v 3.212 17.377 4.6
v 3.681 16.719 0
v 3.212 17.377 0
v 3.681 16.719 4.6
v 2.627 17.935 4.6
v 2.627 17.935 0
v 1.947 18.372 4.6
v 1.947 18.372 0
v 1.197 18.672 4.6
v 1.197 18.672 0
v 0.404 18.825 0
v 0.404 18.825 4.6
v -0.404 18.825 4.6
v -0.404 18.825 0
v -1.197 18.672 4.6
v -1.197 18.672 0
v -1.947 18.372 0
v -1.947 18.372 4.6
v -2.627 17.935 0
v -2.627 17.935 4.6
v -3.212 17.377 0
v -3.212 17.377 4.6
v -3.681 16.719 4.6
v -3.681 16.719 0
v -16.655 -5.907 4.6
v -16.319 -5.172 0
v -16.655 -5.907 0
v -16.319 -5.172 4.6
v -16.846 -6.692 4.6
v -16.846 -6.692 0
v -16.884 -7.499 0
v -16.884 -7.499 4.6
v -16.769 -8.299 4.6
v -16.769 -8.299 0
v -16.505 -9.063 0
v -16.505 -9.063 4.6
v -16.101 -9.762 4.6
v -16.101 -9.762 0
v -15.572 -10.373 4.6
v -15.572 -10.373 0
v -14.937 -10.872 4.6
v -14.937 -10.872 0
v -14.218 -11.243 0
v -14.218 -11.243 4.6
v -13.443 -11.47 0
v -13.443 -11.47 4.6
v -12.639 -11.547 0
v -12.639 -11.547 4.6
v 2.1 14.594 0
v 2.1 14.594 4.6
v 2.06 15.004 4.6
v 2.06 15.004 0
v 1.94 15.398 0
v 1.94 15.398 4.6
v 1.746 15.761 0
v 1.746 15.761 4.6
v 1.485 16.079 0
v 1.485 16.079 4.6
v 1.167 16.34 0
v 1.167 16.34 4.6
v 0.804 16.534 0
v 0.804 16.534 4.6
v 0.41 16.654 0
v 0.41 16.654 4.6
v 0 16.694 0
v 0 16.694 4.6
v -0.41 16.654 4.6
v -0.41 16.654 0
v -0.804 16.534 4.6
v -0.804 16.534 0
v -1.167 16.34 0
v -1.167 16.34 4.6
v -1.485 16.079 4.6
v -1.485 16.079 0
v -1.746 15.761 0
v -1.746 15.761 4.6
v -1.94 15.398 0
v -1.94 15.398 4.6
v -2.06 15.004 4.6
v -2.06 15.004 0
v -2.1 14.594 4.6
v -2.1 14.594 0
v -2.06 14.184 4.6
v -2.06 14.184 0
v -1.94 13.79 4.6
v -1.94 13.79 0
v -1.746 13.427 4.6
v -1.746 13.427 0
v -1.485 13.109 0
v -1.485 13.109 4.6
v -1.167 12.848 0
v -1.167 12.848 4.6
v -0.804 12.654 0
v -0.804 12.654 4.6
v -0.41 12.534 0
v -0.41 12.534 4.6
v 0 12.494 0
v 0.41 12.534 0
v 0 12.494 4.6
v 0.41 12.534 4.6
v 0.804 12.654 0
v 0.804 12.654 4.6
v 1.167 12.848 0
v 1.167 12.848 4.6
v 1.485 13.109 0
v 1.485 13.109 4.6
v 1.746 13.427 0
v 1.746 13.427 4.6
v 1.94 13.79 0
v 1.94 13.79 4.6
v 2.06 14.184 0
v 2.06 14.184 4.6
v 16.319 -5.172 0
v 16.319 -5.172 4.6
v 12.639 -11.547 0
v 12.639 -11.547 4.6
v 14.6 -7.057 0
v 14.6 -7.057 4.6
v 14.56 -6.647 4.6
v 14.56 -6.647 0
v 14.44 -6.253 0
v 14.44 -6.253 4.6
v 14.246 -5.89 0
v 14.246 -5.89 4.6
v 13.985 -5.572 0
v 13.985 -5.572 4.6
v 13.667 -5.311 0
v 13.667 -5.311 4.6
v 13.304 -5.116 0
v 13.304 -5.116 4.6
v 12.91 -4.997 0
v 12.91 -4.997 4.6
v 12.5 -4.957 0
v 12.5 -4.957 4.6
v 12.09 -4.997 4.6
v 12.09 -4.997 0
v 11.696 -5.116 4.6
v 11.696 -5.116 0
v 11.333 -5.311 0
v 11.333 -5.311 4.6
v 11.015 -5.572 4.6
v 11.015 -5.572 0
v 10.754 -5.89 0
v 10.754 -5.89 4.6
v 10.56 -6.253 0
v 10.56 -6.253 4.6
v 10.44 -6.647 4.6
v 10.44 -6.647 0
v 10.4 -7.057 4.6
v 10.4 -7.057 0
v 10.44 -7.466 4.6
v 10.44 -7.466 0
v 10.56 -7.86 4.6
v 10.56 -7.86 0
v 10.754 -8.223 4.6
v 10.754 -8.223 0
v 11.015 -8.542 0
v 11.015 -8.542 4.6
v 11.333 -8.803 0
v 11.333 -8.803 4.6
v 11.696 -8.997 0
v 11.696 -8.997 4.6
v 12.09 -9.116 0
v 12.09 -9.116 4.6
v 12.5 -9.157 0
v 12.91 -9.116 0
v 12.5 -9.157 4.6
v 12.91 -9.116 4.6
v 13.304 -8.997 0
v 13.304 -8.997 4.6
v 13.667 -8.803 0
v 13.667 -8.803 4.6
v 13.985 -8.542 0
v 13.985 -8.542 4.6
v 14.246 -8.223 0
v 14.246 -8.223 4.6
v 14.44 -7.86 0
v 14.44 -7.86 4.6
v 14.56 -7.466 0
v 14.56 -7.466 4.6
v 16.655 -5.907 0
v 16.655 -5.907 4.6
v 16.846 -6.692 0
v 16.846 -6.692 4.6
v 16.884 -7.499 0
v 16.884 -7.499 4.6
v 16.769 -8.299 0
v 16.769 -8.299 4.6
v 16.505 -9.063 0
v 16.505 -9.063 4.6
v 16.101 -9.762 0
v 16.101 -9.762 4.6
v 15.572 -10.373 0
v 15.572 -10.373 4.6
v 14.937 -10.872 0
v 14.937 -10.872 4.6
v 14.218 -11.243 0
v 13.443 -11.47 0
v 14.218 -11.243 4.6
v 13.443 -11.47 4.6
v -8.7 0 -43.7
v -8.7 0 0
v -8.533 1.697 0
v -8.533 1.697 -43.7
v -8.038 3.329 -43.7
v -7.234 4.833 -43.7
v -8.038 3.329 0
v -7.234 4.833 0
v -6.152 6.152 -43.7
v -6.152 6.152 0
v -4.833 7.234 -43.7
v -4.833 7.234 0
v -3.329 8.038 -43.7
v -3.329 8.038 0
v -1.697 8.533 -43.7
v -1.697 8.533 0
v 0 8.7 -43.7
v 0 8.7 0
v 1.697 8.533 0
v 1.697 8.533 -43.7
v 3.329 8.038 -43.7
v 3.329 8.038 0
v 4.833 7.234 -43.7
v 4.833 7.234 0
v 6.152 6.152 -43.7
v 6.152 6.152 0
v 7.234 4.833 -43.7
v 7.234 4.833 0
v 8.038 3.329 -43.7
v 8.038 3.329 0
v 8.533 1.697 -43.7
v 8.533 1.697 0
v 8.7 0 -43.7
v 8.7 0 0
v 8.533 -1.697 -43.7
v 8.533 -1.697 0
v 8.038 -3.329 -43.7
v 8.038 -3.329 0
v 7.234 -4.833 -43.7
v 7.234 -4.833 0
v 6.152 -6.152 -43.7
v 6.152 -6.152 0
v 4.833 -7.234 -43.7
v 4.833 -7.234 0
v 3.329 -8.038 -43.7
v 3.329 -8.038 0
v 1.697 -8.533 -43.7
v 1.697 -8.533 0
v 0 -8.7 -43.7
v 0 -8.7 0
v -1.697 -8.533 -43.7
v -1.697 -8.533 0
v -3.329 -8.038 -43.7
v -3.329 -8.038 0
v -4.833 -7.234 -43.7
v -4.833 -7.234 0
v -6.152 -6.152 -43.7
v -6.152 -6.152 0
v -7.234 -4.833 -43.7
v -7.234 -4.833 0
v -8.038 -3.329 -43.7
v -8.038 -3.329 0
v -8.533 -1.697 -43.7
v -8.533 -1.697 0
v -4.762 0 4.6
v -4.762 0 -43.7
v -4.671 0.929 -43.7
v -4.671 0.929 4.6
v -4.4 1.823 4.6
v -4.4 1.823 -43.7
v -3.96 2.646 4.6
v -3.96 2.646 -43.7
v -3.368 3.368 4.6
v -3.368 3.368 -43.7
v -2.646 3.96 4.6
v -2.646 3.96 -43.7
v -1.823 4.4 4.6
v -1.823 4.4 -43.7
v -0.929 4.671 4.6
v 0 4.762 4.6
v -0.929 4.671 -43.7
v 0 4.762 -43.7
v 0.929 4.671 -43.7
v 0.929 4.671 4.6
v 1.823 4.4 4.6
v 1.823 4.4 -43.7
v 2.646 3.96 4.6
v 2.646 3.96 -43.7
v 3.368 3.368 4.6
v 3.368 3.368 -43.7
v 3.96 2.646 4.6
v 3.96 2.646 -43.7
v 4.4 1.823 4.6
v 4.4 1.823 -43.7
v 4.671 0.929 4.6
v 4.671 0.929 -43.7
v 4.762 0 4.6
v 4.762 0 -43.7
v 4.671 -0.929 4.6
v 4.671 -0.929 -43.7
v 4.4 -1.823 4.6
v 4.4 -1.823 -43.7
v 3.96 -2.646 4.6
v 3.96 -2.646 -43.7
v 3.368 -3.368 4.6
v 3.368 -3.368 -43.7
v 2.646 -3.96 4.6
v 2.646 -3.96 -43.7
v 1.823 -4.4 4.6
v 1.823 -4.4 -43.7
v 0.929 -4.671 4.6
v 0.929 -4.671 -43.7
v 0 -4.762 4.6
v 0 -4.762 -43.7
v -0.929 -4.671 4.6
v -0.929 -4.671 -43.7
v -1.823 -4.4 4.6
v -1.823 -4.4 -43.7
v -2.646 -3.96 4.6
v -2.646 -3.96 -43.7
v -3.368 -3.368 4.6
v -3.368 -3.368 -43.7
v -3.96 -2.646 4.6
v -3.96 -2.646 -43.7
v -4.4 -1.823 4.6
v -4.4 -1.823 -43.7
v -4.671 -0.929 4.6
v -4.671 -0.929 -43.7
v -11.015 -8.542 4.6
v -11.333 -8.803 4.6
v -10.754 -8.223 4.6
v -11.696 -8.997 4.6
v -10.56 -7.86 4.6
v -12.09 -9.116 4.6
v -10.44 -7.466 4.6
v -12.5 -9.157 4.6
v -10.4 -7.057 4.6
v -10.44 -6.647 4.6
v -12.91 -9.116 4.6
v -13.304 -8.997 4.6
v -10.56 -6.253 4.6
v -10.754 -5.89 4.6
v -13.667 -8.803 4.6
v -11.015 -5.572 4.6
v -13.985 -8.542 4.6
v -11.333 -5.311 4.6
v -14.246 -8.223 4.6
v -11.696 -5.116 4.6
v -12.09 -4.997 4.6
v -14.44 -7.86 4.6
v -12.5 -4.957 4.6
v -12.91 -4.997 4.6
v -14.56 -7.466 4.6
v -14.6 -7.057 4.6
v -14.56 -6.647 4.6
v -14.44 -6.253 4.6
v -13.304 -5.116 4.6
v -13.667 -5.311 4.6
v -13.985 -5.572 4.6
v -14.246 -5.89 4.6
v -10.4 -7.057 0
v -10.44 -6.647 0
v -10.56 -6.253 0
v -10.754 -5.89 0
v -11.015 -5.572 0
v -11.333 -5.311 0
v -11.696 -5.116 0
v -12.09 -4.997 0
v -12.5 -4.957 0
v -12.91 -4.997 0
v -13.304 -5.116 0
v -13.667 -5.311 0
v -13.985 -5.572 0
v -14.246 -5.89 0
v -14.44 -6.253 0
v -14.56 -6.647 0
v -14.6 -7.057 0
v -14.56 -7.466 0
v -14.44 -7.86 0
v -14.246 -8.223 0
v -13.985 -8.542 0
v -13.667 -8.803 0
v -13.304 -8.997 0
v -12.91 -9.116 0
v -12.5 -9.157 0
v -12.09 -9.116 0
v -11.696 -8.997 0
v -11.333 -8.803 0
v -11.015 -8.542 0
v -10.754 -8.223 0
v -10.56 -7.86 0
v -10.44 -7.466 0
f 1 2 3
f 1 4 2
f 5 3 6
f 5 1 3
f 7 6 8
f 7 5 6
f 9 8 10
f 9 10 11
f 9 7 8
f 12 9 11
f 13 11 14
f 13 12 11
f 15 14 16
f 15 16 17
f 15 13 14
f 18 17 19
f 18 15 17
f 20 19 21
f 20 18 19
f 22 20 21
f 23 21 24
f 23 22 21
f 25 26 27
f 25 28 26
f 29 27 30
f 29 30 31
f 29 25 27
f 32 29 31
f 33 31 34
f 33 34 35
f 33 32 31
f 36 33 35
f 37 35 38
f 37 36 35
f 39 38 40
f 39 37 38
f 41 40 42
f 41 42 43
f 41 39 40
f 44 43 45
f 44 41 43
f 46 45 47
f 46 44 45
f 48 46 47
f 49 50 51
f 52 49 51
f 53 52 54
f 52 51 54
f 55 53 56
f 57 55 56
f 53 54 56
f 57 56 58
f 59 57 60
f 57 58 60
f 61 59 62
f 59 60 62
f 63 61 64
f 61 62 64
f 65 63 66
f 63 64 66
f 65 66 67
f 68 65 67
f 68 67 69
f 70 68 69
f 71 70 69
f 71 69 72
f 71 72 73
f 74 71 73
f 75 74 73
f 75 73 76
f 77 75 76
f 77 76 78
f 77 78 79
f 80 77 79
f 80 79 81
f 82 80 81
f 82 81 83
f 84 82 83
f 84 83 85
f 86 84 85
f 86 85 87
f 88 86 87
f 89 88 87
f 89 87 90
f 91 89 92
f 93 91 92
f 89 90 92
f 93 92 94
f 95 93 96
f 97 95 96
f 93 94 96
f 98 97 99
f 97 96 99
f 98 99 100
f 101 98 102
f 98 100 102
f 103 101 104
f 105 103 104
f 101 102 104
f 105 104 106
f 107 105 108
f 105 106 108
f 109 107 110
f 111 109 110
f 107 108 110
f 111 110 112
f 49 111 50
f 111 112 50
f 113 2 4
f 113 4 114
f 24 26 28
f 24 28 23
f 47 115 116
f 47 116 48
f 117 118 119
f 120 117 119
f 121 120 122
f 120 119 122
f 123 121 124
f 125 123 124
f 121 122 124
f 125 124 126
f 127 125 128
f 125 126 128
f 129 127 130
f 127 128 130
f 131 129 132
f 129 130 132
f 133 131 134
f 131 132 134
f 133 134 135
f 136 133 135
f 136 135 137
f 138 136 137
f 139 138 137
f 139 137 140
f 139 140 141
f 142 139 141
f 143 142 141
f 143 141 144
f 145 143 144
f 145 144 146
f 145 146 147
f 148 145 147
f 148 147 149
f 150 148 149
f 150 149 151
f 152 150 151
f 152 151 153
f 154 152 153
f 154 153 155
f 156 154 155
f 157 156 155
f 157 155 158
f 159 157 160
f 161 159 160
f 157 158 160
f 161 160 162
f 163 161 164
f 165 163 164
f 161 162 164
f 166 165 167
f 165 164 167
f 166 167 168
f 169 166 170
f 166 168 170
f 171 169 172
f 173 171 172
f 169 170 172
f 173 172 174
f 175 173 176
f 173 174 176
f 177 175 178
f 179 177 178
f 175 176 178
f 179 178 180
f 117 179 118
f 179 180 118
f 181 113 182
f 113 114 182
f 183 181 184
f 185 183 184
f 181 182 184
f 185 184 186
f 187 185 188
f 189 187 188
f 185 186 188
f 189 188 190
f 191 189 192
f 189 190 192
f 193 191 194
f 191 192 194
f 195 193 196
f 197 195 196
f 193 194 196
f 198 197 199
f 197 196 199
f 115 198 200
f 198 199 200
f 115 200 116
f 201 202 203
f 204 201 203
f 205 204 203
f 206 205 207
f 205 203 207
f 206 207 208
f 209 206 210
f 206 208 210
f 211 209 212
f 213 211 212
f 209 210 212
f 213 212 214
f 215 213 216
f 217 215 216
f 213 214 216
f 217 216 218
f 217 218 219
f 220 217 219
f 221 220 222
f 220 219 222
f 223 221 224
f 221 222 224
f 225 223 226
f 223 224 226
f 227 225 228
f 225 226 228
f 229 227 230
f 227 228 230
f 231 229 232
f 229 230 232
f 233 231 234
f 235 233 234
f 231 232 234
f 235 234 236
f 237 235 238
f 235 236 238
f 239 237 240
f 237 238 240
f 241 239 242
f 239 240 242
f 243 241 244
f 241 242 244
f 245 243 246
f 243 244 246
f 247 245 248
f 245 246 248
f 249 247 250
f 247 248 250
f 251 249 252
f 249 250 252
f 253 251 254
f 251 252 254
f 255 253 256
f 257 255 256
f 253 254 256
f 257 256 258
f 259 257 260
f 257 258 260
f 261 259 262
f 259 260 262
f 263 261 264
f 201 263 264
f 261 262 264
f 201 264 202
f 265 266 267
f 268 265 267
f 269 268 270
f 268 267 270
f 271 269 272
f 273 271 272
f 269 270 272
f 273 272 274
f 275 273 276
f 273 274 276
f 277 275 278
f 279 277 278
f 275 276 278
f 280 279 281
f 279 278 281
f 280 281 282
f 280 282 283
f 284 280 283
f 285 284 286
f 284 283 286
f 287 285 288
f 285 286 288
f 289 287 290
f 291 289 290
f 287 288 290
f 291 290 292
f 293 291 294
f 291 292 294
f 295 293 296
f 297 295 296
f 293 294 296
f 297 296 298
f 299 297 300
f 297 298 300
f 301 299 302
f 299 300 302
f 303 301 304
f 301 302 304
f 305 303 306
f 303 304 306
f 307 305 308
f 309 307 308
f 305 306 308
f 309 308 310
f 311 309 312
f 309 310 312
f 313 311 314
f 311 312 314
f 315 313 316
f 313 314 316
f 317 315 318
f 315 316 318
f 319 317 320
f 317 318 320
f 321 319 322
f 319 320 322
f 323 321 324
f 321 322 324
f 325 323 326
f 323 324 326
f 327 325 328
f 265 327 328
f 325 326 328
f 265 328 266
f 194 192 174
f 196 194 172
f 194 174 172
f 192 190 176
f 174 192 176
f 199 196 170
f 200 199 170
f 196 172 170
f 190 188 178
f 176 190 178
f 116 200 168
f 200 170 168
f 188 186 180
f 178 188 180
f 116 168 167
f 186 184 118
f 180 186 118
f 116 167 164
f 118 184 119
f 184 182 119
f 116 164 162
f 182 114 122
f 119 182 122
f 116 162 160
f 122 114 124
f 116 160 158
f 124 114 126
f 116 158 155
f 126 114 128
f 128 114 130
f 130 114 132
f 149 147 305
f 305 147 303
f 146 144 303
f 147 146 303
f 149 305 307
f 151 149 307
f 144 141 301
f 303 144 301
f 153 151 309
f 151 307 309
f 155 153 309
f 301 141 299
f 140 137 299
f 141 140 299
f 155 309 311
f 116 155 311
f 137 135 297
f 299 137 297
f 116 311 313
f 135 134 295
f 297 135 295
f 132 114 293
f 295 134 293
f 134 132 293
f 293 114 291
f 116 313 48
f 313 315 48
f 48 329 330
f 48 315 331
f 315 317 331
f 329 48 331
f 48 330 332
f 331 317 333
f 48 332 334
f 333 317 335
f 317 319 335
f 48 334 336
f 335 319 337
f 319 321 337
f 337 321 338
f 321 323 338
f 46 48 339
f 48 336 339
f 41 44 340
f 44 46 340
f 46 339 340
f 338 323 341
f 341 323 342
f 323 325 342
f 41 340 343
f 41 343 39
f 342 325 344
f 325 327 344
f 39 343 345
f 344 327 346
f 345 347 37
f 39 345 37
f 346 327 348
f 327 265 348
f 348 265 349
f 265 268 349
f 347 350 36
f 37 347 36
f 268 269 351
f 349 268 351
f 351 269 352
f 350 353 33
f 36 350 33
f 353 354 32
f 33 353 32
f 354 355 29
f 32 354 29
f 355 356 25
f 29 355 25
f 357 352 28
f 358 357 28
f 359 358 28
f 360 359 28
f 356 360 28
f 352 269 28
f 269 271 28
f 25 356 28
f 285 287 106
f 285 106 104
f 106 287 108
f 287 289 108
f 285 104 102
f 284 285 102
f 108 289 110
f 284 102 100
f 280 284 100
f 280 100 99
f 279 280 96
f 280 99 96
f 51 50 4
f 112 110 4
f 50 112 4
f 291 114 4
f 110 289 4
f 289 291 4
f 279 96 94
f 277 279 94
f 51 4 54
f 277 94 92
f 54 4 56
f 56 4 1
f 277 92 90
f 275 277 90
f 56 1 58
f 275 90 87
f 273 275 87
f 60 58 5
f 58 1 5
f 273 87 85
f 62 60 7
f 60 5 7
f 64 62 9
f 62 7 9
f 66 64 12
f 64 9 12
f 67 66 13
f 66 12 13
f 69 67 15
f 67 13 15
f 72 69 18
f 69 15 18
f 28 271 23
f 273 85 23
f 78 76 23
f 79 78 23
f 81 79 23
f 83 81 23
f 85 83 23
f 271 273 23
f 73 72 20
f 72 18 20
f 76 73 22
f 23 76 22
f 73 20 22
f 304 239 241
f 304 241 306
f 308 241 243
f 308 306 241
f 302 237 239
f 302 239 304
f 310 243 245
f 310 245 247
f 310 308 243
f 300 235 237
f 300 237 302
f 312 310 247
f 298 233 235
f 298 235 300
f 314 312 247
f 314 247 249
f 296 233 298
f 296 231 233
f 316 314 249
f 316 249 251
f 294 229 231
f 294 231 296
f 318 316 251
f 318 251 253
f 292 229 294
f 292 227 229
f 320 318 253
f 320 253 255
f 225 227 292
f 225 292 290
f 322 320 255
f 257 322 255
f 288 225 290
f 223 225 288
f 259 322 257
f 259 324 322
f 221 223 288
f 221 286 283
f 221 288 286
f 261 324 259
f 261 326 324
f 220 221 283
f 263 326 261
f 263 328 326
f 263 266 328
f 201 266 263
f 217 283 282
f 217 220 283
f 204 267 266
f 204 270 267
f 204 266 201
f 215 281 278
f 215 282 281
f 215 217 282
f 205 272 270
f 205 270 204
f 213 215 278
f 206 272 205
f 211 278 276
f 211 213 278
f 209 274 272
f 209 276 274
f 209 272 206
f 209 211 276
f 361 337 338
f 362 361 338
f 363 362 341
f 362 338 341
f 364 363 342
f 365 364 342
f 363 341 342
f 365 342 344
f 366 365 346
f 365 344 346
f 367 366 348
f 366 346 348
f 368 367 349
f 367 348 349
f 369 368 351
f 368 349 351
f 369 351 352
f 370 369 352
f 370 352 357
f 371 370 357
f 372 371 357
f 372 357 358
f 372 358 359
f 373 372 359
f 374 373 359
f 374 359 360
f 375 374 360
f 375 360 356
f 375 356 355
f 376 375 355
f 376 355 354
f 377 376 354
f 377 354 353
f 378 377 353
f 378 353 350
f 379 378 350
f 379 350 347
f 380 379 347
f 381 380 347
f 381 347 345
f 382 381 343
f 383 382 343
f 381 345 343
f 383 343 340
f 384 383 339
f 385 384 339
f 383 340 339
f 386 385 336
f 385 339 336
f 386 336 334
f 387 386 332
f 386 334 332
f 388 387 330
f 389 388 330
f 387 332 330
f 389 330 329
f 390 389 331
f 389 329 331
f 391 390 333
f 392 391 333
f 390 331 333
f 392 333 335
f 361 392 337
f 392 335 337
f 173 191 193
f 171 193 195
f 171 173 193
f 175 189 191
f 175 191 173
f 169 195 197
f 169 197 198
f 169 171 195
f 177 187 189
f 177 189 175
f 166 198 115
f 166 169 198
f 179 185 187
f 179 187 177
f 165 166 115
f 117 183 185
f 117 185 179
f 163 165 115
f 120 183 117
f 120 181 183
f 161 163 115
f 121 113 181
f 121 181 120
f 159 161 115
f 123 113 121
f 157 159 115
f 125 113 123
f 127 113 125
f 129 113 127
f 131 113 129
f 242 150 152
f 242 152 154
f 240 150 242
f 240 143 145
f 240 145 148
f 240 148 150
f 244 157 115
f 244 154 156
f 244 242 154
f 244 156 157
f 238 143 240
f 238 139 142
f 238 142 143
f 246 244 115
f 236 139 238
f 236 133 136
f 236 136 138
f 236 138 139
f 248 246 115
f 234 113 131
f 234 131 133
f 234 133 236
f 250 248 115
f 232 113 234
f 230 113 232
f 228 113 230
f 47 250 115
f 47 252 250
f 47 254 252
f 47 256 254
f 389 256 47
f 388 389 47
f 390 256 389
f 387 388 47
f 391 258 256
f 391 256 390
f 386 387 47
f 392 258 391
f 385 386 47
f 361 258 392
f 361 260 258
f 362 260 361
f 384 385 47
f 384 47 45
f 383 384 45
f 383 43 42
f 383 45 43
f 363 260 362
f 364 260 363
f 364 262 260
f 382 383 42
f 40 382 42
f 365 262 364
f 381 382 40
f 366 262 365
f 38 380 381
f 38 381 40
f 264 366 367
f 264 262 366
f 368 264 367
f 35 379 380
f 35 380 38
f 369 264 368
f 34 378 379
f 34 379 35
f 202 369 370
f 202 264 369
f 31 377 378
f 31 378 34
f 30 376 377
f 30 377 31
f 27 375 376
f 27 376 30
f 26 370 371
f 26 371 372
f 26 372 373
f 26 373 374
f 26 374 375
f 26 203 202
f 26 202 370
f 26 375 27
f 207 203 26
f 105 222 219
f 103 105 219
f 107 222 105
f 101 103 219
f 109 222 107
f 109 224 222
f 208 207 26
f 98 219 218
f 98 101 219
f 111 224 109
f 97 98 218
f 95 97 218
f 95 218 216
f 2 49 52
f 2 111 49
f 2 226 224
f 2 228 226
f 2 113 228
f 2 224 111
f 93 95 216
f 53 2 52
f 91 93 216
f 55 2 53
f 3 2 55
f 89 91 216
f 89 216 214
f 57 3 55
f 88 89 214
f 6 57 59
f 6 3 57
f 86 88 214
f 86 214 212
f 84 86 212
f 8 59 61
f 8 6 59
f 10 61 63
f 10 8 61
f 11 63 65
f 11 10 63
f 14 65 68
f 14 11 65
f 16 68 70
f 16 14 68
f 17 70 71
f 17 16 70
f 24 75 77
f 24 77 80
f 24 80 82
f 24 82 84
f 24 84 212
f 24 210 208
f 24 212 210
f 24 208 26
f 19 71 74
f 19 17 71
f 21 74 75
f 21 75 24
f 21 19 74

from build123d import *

# Parameters (mm, degrees)
BOSS_EXTRUDE1_DEPTH   = 4.6
M5X0_8_TAPPED_HOLE1_D = 4.2
FILLET1_R             = 4.25
SKETCH9_R             = 8.7
BOSS_EXTRUDE2_DEPTH   = 43.7
SKETCH10_R            = 4.7625
CUT_EXTRUDE1_DEPTH    = 48.3


with BuildPart() as part:
    # Sketch1 → Boss-Extrude1 (new body)
    with BuildSketch(Plane.XY):
        Polygon((0, 23.094010768), (20, -11.547005384), (-20, -11.547005384), align=None)
    extrude(amount=BOSS_EXTRUDE1_DEPTH)

    # M5x0.8 Tapped Hole1 (through all)
    with Locations(Plane(origin=(0, 0, 0), x_dir=(-1, 0, 0), z_dir=(0, 0, -1))):
        with Locations((0, 14.594010768), (-12.5, -7.056624327), (12.5, -7.056624327)):
            Hole(M5X0_8_TAPPED_HOLE1_D / 2)

    # Fillet1
    fillet1_edges = [part.edges().sort_by_distance(p)[0] for p in [
        (0, 23.094010768, 2.3),
        (20, -11.547005384, 2.3),
        (-20, -11.547005384, 2.3),
    ]]
    fillet(fillet1_edges, radius=FILLET1_R)

    # Sketch9 → Boss-Extrude2 (add)
    with BuildSketch(Plane(origin=(0, 0, 0), x_dir=(-1, 0, 0), z_dir=(0, 0, -1))):
        Circle(SKETCH9_R)
    extrude(amount=BOSS_EXTRUDE2_DEPTH)

    # Sketch10 → Cut-Extrude1 (cut)
    with BuildSketch(Plane(origin=(0, 0, -43.7), x_dir=(-1, 0, 0), z_dir=(0, 0, -1))):
        Circle(SKETCH10_R)
    extrude(amount=-CUT_EXTRUDE1_DEPTH, mode=Mode.SUBTRACT)


solid = part.part
